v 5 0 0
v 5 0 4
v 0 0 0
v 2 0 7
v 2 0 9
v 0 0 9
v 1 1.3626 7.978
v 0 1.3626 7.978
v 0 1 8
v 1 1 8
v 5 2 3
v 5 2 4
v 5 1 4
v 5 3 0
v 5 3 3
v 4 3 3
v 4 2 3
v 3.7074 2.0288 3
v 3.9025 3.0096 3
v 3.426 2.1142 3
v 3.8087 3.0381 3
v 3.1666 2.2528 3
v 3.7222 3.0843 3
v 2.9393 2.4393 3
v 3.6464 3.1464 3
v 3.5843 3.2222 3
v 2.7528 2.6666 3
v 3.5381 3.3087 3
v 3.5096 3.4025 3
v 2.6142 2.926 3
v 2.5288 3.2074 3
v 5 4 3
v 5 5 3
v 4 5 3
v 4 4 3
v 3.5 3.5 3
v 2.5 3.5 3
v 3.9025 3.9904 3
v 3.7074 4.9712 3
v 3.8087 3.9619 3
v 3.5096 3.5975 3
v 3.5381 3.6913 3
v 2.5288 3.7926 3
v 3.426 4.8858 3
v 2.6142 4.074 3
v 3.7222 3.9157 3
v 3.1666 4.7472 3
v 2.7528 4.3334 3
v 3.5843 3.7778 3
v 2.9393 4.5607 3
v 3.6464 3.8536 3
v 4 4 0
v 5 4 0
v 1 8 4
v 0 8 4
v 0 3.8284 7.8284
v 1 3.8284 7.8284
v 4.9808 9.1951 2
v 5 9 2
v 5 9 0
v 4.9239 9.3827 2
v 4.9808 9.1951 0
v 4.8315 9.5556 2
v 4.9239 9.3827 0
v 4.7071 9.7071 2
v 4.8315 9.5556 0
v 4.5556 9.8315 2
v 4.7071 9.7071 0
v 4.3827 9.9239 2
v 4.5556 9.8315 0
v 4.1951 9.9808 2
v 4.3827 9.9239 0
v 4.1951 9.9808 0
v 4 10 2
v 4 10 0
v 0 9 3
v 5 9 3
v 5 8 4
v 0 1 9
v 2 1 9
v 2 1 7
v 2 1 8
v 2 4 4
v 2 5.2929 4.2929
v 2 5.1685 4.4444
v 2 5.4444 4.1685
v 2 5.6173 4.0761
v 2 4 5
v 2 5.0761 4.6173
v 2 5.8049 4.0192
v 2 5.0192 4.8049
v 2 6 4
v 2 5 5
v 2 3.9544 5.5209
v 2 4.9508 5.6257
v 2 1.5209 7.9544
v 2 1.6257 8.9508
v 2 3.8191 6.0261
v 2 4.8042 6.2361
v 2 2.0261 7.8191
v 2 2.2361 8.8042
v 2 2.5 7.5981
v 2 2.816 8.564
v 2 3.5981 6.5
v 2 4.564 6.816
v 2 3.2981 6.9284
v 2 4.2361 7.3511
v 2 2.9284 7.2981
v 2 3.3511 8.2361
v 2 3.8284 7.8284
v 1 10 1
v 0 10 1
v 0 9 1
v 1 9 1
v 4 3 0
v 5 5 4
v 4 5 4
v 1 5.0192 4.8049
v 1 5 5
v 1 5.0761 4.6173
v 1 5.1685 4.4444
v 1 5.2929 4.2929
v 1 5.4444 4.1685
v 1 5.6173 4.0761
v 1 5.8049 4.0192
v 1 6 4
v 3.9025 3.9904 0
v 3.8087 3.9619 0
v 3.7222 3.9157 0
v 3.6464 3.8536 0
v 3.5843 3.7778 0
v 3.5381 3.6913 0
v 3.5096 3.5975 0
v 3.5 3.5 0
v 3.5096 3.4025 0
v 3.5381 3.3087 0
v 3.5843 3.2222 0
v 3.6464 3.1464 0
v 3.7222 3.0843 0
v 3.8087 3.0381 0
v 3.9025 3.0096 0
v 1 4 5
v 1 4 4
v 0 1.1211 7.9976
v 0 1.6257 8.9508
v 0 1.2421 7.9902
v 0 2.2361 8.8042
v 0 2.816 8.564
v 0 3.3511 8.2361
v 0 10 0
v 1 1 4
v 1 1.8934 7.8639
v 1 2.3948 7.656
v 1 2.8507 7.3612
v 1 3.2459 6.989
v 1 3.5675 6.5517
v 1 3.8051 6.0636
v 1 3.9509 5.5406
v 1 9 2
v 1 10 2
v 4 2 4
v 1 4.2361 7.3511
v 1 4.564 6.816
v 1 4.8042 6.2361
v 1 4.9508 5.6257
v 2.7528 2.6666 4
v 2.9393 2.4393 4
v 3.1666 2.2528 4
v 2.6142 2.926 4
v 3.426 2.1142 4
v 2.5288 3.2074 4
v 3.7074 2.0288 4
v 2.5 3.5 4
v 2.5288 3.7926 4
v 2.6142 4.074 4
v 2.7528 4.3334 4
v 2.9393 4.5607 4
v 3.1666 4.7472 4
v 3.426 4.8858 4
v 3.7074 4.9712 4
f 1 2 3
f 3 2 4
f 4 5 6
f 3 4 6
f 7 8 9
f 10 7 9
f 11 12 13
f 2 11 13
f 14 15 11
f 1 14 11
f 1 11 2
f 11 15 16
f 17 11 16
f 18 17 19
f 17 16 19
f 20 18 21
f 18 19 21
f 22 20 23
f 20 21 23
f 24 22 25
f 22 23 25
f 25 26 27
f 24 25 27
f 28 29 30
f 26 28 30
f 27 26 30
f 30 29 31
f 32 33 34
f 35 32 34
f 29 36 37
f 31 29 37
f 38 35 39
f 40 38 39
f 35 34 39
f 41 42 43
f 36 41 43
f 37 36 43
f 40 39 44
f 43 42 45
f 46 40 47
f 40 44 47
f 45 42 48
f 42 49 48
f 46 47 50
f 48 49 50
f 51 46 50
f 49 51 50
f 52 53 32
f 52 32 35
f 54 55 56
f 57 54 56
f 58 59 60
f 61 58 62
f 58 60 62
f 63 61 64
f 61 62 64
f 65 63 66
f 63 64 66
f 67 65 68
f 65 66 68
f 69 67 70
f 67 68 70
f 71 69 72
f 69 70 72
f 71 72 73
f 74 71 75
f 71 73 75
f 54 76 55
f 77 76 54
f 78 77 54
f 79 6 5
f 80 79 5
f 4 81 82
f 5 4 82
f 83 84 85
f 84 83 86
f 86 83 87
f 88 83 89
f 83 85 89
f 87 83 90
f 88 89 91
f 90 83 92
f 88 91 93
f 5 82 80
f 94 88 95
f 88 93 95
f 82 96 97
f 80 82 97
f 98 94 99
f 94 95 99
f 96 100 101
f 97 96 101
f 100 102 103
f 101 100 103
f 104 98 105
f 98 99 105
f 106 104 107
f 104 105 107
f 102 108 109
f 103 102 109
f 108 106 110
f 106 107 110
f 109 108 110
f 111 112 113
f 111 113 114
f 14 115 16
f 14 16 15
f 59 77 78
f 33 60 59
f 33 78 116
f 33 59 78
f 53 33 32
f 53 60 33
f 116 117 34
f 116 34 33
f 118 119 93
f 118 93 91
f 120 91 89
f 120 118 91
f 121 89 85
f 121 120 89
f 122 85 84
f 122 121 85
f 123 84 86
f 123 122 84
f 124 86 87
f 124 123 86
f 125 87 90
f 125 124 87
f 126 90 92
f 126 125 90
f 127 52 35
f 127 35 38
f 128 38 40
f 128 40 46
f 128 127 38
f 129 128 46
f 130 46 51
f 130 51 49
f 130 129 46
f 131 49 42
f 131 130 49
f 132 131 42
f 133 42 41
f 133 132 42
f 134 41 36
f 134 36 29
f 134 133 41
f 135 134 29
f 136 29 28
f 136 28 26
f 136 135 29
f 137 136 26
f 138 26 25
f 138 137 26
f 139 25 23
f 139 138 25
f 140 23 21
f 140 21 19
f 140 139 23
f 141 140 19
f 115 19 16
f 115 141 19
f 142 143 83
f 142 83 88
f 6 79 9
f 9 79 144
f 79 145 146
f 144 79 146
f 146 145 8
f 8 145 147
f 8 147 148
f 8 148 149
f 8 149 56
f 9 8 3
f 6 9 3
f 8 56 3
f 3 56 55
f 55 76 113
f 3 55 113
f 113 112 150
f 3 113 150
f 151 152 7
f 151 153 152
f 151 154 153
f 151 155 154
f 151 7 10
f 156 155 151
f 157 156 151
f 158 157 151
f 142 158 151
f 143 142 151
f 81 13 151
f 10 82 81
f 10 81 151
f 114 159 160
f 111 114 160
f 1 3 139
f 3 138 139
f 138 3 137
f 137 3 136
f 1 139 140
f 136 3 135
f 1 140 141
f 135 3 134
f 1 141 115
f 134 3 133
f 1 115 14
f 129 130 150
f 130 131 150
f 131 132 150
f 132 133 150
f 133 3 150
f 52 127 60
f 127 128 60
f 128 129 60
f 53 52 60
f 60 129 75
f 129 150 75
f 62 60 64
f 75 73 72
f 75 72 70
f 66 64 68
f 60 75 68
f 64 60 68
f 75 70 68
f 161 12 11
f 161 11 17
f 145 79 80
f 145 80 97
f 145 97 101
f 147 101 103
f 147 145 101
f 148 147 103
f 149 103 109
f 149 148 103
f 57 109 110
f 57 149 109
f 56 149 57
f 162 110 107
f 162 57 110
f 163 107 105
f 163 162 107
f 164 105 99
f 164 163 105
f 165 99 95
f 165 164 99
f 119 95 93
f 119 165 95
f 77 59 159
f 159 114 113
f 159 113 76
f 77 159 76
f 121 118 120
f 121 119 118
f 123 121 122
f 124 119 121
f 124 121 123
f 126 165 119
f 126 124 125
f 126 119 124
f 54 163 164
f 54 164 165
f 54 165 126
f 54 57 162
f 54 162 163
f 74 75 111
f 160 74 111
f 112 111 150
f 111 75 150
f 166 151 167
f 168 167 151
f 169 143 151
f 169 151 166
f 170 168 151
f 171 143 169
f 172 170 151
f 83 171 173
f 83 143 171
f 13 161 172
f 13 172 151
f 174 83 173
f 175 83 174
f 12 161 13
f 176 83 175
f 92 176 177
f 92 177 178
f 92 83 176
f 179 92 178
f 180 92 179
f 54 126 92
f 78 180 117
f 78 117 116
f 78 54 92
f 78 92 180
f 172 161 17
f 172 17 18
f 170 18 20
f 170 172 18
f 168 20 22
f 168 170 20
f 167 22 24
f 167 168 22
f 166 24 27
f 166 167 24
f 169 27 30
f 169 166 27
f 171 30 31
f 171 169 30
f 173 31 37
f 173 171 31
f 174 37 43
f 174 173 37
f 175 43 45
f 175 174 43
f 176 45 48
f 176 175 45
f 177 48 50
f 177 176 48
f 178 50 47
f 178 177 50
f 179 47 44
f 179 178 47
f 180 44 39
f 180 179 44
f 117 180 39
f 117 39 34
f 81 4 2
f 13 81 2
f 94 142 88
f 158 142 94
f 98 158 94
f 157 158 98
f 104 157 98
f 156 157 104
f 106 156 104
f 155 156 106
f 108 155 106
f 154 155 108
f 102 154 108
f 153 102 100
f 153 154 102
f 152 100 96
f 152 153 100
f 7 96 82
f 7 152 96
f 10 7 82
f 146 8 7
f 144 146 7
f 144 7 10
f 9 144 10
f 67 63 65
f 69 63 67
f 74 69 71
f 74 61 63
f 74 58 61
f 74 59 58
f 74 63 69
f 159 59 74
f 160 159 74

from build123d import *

# Parameters (mm, degrees)
BOSS_EXTRUDE1_DEPTH = 4
CUT_EXTRUDE1_DEPTH  = 1
SKETCH3_W           = 1
SKETCH3_H           = 1
CUT_EXTRUDE2_DEPTH  = 3
SKETCH4_W           = 2
SKETCH4_H           = 1
CUT_EXTRUDE4_DEPTH  = 6
CUT_EXTRUDE5_DEPTH  = 6
BOSS_EXTRUDE2_DEPTH = 1
BOSS_EXTRUDE3_DEPTH = 2
BOSS_EXTRUDE4_DEPTH = 1


with BuildPart() as part:
    # Sketch1 → Boss-Extrude1 (new body)
    with BuildSketch(Plane.XY):
        with BuildLine():
            Line((0, 9), (5, 9))
            ThreePointArc((5, 9), (4.707106781, 9.707106781), (4, 10))
            Line((4, 10), (0, 10))
            Line((0, 10), (0, 9))
        make_face()
        with BuildLine():
            ThreePointArc((4, 4), (3.5, 3.5), (4, 3))
            Line((4, 3), (5, 3))
            Line((5, 3), (5, 0))
            Line((5, 0), (0, 0))
            Line((0, 0), (0, 9))
            Line((0, 9), (5, 9))
            Line((5, 9), (5, 4))
            Line((5, 4), (4, 4))
        make_face()
    extrude(amount=BOSS_EXTRUDE1_DEPTH)

    # Sketch2 → Cut-Extrude1 (cut)
    with BuildSketch(Plane.XY.offset(4)):
        with BuildLine():
            Line((5, 3), (5, 2))
            Line((5, 2), (4, 2))
            ThreePointArc((4, 2), (2.5, 3.5), (4, 5))
            Line((4, 5), (5, 5))
            Line((5, 5), (5, 4))
            Line((5, 4), (4, 4))
            ThreePointArc((4, 4), (3.5, 3.5), (4, 3))
            Line((4, 3), (5, 3))
        make_face()
    extrude(amount=-CUT_EXTRUDE1_DEPTH, mode=Mode.SUBTRACT)

    # Sketch3 → Cut-Extrude2 (cut)
    with BuildSketch(Plane.XY.offset(4)):
        with Locations((0.5, 9.5)):
            Rectangle(SKETCH3_W, SKETCH3_H)
    extrude(amount=-CUT_EXTRUDE2_DEPTH, mode=Mode.SUBTRACT)

    # Sketch4 → Cut-Extrude4 (cut, through all)
    with BuildSketch(Plane.ZY):
        with Locations((3, 9.5)):
            Rectangle(SKETCH4_W, SKETCH4_H)
    extrude(amount=-CUT_EXTRUDE4_DEPTH, mode=Mode.SUBTRACT)

    # Sketch5 → Cut-Extrude5 (cut, through all)
    with BuildSketch(Plane(origin=(5, 0, 0), x_dir=(0, 0, -1), z_dir=(1, 0, 0))):
        Polygon((-3, 9), (-4, 8), (-4, 9), align=None)
    extrude(amount=-CUT_EXTRUDE5_DEPTH, mode=Mode.SUBTRACT)

    # Sketch6 → Boss-Extrude2 (add)
    with BuildSketch(Plane.XZ):
        Polygon((0, 4), (0, 9), (2, 9), (2, 7), (5, 4), align=None)
    extrude(amount=-BOSS_EXTRUDE2_DEPTH)

    # Sketch7 → Boss-Extrude3 (add)
    with BuildSketch(Plane.ZY):
        with BuildLine():
            Line((8, 1), (9, 1))
            ThreePointArc((9, 1), (7.828427125, 3.828427125), (5, 5))
            ThreePointArc((5, 5), (4.292893219, 5.292893219), (4, 6))
            Line((4, 6), (4, 4))
            Line((4, 4), (5, 4))
            ThreePointArc((5, 4), (7.121320344, 3.121320344), (8, 1))
        make_face()
    extrude(amount=-BOSS_EXTRUDE3_DEPTH)

    # Sketch9 → Boss-Extrude4 (add)
    with BuildSketch(Plane.ZY):
        Polygon((4, 8), (7.828427125, 3.828427125), (8, 1), (4, 1), align=None)
    extrude(amount=-BOSS_EXTRUDE4_DEPTH)


solid = part.part
